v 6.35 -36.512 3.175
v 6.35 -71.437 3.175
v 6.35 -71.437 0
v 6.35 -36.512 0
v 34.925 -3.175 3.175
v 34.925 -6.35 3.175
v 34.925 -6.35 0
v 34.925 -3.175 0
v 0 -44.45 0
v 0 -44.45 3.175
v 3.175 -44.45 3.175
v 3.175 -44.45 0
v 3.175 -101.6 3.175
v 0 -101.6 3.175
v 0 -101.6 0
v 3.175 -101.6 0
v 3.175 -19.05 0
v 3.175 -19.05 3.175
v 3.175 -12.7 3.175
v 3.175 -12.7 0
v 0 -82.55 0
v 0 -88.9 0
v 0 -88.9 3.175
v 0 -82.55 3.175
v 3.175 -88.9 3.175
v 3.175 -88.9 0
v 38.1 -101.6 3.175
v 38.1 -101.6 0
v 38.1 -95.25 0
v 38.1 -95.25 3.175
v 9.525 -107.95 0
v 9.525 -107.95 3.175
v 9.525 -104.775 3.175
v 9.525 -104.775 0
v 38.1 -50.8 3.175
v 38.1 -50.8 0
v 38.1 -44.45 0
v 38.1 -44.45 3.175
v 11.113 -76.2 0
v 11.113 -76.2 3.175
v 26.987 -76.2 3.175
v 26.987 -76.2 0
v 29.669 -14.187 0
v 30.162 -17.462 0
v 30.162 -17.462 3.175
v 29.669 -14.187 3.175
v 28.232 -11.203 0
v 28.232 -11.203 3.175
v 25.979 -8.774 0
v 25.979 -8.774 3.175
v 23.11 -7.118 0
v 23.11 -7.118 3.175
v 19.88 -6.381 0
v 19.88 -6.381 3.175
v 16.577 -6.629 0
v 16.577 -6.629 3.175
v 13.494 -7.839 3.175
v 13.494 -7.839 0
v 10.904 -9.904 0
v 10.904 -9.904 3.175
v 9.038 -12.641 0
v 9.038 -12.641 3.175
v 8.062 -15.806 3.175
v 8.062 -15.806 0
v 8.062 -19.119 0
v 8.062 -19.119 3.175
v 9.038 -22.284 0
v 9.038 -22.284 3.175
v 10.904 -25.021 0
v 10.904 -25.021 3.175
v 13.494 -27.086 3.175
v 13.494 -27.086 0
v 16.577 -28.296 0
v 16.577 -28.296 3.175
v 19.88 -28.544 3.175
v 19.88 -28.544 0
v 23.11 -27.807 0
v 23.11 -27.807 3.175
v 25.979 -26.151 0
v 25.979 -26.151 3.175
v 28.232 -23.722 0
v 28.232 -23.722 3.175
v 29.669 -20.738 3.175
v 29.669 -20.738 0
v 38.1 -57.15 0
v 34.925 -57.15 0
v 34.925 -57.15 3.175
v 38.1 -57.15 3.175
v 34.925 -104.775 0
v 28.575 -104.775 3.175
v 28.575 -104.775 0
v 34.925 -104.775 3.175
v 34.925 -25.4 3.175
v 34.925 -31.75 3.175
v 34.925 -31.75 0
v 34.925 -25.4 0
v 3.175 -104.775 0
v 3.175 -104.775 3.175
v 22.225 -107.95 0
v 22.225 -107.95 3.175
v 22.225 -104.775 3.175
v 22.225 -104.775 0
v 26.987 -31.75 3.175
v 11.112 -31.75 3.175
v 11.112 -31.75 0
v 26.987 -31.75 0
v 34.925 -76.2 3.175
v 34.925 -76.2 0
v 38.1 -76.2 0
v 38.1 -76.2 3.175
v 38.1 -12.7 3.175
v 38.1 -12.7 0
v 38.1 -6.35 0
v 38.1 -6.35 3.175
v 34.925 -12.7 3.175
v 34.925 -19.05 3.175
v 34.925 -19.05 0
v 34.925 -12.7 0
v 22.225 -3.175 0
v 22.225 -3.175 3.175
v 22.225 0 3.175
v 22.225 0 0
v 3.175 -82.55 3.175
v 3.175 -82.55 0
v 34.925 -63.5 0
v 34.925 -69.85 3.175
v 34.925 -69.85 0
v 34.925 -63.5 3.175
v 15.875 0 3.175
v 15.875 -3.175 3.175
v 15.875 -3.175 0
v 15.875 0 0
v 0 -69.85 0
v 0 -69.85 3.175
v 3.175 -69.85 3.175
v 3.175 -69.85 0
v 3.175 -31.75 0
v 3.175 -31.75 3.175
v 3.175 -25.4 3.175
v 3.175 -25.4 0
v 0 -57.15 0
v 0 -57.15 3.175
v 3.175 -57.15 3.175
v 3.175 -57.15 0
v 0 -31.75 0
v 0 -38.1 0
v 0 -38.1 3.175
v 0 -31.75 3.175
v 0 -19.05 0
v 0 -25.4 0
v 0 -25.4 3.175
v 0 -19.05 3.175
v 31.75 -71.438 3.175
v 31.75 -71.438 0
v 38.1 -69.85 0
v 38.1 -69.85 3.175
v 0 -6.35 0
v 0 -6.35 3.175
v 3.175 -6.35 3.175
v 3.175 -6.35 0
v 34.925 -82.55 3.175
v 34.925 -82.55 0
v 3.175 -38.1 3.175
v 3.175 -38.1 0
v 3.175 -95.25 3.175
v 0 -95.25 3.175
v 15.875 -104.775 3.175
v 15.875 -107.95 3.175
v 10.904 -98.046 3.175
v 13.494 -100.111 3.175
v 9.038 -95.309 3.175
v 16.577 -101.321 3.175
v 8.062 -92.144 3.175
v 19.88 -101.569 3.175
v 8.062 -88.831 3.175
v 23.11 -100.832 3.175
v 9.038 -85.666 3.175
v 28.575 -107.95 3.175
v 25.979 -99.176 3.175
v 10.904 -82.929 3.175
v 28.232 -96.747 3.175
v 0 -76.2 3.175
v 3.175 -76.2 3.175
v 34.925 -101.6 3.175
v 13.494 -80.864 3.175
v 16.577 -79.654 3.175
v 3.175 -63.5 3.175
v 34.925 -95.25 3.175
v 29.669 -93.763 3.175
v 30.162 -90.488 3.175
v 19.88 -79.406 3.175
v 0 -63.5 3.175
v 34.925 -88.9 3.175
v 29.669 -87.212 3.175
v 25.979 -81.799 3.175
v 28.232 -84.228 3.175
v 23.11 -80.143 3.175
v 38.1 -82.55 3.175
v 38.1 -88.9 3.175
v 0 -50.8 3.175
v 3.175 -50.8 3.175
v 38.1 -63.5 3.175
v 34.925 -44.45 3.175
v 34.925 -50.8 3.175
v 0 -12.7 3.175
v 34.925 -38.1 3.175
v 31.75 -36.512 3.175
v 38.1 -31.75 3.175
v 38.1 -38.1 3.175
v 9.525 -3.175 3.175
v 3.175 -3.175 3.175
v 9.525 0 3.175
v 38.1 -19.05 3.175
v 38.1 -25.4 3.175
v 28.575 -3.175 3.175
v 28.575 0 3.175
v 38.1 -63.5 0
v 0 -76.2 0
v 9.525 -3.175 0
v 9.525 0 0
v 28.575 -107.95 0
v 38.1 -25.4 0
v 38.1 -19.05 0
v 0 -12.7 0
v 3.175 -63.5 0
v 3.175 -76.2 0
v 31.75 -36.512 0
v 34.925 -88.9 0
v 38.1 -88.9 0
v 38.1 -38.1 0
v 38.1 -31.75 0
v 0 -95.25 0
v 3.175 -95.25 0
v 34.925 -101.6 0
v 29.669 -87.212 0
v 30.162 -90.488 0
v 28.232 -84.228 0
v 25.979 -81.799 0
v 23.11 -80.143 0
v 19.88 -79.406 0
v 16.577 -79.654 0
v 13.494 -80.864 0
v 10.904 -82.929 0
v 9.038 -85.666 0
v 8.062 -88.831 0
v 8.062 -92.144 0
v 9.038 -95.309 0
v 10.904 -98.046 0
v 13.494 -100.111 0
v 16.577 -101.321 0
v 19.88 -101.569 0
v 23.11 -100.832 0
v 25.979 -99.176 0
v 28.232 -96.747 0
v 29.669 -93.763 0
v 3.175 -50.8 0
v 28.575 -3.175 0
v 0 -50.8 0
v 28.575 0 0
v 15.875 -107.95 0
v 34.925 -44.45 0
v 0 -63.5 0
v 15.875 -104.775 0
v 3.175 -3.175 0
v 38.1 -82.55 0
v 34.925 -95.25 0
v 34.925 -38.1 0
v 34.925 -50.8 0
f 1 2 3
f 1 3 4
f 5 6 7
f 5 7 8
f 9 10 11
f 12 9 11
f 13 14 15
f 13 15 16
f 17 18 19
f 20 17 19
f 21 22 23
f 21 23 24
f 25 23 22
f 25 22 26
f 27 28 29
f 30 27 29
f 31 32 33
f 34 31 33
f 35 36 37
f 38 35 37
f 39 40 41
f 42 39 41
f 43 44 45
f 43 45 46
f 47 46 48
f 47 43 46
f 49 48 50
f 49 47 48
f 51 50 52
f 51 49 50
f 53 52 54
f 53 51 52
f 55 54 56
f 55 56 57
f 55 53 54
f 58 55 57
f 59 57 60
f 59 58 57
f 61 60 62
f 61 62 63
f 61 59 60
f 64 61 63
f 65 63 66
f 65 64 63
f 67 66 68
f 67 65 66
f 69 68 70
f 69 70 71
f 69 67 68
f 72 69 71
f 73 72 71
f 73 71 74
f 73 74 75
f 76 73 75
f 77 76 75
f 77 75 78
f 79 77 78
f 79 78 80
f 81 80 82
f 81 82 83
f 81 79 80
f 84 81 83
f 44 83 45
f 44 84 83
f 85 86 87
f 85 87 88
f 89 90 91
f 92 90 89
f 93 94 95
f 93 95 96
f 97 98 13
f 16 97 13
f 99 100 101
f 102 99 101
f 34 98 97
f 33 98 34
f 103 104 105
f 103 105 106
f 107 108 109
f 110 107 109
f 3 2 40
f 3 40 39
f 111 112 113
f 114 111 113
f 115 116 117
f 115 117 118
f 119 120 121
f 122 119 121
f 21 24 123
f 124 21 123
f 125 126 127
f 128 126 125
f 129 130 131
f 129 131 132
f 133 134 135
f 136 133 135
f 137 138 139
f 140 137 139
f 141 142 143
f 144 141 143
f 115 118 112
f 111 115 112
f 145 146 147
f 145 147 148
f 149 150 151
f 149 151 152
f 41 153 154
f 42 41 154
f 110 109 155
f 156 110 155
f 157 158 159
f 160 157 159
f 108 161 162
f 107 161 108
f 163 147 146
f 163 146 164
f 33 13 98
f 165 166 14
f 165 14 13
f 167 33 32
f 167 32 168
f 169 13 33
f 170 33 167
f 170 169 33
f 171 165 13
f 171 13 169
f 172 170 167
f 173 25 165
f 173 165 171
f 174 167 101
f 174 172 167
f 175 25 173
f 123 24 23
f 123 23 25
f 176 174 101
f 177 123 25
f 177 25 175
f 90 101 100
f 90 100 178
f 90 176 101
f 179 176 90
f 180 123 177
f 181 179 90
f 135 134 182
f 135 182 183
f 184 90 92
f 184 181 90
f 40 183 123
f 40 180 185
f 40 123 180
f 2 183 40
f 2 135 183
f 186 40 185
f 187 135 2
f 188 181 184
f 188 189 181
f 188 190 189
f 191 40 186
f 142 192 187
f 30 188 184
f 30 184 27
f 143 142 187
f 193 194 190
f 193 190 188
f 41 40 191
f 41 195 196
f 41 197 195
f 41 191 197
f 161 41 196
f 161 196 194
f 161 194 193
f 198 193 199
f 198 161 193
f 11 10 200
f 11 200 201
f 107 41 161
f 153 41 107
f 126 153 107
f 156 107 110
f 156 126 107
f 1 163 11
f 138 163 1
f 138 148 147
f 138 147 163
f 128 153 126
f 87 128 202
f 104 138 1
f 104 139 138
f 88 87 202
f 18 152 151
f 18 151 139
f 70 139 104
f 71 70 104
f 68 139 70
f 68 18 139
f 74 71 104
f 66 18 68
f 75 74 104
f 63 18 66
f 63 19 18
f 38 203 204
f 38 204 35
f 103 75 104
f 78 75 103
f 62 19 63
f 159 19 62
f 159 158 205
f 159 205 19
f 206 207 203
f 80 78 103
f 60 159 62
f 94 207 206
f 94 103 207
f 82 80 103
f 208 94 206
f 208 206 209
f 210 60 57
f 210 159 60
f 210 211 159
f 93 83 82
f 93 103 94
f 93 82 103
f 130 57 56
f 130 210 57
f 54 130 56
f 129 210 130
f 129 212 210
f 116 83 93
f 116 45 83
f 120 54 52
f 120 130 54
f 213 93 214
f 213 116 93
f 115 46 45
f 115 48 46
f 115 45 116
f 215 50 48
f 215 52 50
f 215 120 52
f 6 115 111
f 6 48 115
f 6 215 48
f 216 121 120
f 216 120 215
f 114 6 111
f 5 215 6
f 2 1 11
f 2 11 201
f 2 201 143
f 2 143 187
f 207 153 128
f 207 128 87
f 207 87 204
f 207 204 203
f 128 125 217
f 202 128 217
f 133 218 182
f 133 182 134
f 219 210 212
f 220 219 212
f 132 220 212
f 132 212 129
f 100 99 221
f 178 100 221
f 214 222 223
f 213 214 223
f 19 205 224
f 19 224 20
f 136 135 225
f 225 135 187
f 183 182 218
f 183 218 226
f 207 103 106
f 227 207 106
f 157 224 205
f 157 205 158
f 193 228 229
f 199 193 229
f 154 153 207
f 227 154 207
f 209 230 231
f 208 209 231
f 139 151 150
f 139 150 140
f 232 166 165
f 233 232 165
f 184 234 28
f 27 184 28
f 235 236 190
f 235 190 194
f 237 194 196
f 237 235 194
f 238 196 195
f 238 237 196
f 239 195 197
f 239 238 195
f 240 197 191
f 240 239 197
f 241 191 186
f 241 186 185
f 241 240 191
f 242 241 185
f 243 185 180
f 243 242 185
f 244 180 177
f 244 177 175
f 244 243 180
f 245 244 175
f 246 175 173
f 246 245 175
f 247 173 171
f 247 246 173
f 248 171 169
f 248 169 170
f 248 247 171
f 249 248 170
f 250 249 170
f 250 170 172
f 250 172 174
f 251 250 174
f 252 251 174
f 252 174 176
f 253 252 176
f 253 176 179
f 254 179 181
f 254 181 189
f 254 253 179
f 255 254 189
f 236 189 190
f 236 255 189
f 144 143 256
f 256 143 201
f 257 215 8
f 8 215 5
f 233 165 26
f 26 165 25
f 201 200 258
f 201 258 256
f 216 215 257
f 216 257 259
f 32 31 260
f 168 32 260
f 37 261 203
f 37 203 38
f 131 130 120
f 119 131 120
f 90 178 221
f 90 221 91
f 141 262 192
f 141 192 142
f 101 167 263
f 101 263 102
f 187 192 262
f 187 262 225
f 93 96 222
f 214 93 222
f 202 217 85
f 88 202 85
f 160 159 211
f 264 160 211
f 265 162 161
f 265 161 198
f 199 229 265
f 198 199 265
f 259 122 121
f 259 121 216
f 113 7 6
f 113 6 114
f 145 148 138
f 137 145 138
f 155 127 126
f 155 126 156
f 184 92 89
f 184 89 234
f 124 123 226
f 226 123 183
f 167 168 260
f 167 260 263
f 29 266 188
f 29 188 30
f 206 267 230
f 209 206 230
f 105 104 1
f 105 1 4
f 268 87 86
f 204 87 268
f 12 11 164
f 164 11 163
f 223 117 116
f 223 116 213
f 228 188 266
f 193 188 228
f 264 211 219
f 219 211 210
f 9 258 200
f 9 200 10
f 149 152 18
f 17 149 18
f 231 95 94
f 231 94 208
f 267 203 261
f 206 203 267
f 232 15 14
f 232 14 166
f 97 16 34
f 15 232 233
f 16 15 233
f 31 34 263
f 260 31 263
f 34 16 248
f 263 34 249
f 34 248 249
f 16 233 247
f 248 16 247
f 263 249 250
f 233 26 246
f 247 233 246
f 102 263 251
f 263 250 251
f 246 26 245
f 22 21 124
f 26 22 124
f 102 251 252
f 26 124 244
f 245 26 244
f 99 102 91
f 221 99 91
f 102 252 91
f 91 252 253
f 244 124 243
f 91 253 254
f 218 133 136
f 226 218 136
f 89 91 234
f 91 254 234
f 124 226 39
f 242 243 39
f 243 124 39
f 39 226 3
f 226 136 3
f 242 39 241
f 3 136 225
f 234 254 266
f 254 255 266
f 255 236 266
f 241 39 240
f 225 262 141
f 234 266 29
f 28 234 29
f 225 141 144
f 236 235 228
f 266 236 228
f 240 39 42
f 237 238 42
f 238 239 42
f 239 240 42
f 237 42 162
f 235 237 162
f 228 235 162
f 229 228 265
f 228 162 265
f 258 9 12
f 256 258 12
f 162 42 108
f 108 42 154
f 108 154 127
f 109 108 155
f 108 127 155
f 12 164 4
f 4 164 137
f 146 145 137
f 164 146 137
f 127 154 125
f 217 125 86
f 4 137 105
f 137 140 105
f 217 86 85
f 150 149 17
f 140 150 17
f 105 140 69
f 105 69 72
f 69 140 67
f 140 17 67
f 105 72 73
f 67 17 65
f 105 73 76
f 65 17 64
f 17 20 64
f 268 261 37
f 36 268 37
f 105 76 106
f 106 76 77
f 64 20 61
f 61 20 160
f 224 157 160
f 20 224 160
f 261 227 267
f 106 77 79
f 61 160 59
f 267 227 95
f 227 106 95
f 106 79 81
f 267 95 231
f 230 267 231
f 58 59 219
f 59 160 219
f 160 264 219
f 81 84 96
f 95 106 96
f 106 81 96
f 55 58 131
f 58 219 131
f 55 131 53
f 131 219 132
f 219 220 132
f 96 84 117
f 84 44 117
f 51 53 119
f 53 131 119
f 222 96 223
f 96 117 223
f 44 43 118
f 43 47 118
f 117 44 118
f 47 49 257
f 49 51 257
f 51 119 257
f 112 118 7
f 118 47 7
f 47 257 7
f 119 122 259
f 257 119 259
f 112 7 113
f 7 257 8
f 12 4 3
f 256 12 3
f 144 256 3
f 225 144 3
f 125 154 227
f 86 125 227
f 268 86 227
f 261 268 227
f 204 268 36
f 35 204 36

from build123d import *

# Parameters (mm, degrees)
F0_W     = 38.1
F0_H     = 107.95
F0_R     = 11.1125
F1_DEPTH = 3.175
F2_W     = 3.175
F2_H     = 6.35
F2_W_2   = 25.4
F2_H_2   = 44.45
F3_DEPTH = 3.175
F4_W     = 6.35
F4_H     = 3.175
F5_DEPTH = 3.175
F6_SIZE  = 4.7625


with BuildPart() as f1:
    # F0 (on Top) → F1 (new body)
    with BuildSketch(Plane.XY):
        with Locations((19.05, -53.975)):
            Rectangle(F0_W, F0_H)
        with Locations((19.05, -90.4875)):
            Circle(F0_R, mode=Mode.SUBTRACT)
        with Locations((19.05, -17.4625)):
            Circle(F0_R, mode=Mode.SUBTRACT)
    extrude(amount=F1_DEPTH)

    # F2 (on face) → F3 (cut, through all)
    with BuildSketch(Plane.XY.offset(3.175)):
        with Locations((36.5125, -3.175)):
            Rectangle(F2_W, F2_H)
        with Locations((1.5875, -3.175)):
            Rectangle(F2_W, F2_H)
        with Locations((1.5875, -15.875)):
            Rectangle(F2_W, F2_H)
        with Locations((36.5125, -15.875)):
            Rectangle(F2_W, F2_H)
        with Locations((36.5125, -28.575)):
            Rectangle(F2_W, F2_H)
        with Locations((36.5125, -41.275)):
            Rectangle(F2_W, F2_H)
        with Locations((36.5125, -53.975)):
            Rectangle(F2_W, F2_H)
        with Locations((36.5125, -66.675)):
            Rectangle(F2_W, F2_H)
        with Locations((36.5125, -79.375)):
            Rectangle(F2_W, F2_H)
        with Locations((36.5125, -92.075)):
            Rectangle(F2_W, F2_H)
        with Locations((36.5125, -104.775)):
            Rectangle(F2_W, F2_H)
        with Locations((36.5125, -117.475)):
            Rectangle(F2_W, F2_H)
        with Locations((36.5125, -130.175)):
            Rectangle(F2_W, F2_H)
        with Locations((1.5875, -28.575)):
            Rectangle(F2_W, F2_H)
        with Locations((1.5875, -41.275)):
            Rectangle(F2_W, F2_H)
        with Locations((1.5875, -53.975)):
            Rectangle(F2_W, F2_H)
        with Locations((1.5875, -66.675)):
            Rectangle(F2_W, F2_H)
        with Locations((1.5875, -79.375)):
            Rectangle(F2_W, F2_H)
        with Locations((1.5875, -92.075)):
            Rectangle(F2_W, F2_H)
        with Locations((1.5875, -104.775)):
            Rectangle(F2_W, F2_H)
        with Locations((1.5875, -117.475)):
            Rectangle(F2_W, F2_H)
        with Locations((1.5875, -130.175)):
            Rectangle(F2_W, F2_H)
        with Locations((19.05, -53.975)):
            Rectangle(F2_W_2, F2_H_2)
    extrude(amount=-F3_DEPTH, mode=Mode.SUBTRACT)

    # F4 (on face) → F5 (cut, through all)
    with BuildSketch(Plane.XY.offset(3.175)):
        with Locations((19.05, -1.5875)):
            Rectangle(F4_W, F4_H)
        with Locations((31.75, -1.5875)):
            Rectangle(F4_W, F4_H)
        with Locations((6.35, -1.5875)):
            Rectangle(F4_W, F4_H)
        with Locations((31.75, -106.3625)):
            Rectangle(F4_W, F4_H)
        with Locations((6.35, -106.3625)):
            Rectangle(F4_W, F4_H)
        with Locations((19.05, -106.3625)):
            Rectangle(F4_W, F4_H)
    extrude(amount=-F5_DEPTH, mode=Mode.SUBTRACT)

    # F6
    f6_edges = [f1.edges().sort_by_distance(p)[0] for p in [
        (31.75, -31.75, 1.5875),
        (6.35, -31.75, 1.5875),
        (6.35, -76.2, 1.5875),
        (31.75, -76.2, 1.5875),
    ]]
    chamfer(f6_edges, length=F6_SIZE)


solid = f1.part
